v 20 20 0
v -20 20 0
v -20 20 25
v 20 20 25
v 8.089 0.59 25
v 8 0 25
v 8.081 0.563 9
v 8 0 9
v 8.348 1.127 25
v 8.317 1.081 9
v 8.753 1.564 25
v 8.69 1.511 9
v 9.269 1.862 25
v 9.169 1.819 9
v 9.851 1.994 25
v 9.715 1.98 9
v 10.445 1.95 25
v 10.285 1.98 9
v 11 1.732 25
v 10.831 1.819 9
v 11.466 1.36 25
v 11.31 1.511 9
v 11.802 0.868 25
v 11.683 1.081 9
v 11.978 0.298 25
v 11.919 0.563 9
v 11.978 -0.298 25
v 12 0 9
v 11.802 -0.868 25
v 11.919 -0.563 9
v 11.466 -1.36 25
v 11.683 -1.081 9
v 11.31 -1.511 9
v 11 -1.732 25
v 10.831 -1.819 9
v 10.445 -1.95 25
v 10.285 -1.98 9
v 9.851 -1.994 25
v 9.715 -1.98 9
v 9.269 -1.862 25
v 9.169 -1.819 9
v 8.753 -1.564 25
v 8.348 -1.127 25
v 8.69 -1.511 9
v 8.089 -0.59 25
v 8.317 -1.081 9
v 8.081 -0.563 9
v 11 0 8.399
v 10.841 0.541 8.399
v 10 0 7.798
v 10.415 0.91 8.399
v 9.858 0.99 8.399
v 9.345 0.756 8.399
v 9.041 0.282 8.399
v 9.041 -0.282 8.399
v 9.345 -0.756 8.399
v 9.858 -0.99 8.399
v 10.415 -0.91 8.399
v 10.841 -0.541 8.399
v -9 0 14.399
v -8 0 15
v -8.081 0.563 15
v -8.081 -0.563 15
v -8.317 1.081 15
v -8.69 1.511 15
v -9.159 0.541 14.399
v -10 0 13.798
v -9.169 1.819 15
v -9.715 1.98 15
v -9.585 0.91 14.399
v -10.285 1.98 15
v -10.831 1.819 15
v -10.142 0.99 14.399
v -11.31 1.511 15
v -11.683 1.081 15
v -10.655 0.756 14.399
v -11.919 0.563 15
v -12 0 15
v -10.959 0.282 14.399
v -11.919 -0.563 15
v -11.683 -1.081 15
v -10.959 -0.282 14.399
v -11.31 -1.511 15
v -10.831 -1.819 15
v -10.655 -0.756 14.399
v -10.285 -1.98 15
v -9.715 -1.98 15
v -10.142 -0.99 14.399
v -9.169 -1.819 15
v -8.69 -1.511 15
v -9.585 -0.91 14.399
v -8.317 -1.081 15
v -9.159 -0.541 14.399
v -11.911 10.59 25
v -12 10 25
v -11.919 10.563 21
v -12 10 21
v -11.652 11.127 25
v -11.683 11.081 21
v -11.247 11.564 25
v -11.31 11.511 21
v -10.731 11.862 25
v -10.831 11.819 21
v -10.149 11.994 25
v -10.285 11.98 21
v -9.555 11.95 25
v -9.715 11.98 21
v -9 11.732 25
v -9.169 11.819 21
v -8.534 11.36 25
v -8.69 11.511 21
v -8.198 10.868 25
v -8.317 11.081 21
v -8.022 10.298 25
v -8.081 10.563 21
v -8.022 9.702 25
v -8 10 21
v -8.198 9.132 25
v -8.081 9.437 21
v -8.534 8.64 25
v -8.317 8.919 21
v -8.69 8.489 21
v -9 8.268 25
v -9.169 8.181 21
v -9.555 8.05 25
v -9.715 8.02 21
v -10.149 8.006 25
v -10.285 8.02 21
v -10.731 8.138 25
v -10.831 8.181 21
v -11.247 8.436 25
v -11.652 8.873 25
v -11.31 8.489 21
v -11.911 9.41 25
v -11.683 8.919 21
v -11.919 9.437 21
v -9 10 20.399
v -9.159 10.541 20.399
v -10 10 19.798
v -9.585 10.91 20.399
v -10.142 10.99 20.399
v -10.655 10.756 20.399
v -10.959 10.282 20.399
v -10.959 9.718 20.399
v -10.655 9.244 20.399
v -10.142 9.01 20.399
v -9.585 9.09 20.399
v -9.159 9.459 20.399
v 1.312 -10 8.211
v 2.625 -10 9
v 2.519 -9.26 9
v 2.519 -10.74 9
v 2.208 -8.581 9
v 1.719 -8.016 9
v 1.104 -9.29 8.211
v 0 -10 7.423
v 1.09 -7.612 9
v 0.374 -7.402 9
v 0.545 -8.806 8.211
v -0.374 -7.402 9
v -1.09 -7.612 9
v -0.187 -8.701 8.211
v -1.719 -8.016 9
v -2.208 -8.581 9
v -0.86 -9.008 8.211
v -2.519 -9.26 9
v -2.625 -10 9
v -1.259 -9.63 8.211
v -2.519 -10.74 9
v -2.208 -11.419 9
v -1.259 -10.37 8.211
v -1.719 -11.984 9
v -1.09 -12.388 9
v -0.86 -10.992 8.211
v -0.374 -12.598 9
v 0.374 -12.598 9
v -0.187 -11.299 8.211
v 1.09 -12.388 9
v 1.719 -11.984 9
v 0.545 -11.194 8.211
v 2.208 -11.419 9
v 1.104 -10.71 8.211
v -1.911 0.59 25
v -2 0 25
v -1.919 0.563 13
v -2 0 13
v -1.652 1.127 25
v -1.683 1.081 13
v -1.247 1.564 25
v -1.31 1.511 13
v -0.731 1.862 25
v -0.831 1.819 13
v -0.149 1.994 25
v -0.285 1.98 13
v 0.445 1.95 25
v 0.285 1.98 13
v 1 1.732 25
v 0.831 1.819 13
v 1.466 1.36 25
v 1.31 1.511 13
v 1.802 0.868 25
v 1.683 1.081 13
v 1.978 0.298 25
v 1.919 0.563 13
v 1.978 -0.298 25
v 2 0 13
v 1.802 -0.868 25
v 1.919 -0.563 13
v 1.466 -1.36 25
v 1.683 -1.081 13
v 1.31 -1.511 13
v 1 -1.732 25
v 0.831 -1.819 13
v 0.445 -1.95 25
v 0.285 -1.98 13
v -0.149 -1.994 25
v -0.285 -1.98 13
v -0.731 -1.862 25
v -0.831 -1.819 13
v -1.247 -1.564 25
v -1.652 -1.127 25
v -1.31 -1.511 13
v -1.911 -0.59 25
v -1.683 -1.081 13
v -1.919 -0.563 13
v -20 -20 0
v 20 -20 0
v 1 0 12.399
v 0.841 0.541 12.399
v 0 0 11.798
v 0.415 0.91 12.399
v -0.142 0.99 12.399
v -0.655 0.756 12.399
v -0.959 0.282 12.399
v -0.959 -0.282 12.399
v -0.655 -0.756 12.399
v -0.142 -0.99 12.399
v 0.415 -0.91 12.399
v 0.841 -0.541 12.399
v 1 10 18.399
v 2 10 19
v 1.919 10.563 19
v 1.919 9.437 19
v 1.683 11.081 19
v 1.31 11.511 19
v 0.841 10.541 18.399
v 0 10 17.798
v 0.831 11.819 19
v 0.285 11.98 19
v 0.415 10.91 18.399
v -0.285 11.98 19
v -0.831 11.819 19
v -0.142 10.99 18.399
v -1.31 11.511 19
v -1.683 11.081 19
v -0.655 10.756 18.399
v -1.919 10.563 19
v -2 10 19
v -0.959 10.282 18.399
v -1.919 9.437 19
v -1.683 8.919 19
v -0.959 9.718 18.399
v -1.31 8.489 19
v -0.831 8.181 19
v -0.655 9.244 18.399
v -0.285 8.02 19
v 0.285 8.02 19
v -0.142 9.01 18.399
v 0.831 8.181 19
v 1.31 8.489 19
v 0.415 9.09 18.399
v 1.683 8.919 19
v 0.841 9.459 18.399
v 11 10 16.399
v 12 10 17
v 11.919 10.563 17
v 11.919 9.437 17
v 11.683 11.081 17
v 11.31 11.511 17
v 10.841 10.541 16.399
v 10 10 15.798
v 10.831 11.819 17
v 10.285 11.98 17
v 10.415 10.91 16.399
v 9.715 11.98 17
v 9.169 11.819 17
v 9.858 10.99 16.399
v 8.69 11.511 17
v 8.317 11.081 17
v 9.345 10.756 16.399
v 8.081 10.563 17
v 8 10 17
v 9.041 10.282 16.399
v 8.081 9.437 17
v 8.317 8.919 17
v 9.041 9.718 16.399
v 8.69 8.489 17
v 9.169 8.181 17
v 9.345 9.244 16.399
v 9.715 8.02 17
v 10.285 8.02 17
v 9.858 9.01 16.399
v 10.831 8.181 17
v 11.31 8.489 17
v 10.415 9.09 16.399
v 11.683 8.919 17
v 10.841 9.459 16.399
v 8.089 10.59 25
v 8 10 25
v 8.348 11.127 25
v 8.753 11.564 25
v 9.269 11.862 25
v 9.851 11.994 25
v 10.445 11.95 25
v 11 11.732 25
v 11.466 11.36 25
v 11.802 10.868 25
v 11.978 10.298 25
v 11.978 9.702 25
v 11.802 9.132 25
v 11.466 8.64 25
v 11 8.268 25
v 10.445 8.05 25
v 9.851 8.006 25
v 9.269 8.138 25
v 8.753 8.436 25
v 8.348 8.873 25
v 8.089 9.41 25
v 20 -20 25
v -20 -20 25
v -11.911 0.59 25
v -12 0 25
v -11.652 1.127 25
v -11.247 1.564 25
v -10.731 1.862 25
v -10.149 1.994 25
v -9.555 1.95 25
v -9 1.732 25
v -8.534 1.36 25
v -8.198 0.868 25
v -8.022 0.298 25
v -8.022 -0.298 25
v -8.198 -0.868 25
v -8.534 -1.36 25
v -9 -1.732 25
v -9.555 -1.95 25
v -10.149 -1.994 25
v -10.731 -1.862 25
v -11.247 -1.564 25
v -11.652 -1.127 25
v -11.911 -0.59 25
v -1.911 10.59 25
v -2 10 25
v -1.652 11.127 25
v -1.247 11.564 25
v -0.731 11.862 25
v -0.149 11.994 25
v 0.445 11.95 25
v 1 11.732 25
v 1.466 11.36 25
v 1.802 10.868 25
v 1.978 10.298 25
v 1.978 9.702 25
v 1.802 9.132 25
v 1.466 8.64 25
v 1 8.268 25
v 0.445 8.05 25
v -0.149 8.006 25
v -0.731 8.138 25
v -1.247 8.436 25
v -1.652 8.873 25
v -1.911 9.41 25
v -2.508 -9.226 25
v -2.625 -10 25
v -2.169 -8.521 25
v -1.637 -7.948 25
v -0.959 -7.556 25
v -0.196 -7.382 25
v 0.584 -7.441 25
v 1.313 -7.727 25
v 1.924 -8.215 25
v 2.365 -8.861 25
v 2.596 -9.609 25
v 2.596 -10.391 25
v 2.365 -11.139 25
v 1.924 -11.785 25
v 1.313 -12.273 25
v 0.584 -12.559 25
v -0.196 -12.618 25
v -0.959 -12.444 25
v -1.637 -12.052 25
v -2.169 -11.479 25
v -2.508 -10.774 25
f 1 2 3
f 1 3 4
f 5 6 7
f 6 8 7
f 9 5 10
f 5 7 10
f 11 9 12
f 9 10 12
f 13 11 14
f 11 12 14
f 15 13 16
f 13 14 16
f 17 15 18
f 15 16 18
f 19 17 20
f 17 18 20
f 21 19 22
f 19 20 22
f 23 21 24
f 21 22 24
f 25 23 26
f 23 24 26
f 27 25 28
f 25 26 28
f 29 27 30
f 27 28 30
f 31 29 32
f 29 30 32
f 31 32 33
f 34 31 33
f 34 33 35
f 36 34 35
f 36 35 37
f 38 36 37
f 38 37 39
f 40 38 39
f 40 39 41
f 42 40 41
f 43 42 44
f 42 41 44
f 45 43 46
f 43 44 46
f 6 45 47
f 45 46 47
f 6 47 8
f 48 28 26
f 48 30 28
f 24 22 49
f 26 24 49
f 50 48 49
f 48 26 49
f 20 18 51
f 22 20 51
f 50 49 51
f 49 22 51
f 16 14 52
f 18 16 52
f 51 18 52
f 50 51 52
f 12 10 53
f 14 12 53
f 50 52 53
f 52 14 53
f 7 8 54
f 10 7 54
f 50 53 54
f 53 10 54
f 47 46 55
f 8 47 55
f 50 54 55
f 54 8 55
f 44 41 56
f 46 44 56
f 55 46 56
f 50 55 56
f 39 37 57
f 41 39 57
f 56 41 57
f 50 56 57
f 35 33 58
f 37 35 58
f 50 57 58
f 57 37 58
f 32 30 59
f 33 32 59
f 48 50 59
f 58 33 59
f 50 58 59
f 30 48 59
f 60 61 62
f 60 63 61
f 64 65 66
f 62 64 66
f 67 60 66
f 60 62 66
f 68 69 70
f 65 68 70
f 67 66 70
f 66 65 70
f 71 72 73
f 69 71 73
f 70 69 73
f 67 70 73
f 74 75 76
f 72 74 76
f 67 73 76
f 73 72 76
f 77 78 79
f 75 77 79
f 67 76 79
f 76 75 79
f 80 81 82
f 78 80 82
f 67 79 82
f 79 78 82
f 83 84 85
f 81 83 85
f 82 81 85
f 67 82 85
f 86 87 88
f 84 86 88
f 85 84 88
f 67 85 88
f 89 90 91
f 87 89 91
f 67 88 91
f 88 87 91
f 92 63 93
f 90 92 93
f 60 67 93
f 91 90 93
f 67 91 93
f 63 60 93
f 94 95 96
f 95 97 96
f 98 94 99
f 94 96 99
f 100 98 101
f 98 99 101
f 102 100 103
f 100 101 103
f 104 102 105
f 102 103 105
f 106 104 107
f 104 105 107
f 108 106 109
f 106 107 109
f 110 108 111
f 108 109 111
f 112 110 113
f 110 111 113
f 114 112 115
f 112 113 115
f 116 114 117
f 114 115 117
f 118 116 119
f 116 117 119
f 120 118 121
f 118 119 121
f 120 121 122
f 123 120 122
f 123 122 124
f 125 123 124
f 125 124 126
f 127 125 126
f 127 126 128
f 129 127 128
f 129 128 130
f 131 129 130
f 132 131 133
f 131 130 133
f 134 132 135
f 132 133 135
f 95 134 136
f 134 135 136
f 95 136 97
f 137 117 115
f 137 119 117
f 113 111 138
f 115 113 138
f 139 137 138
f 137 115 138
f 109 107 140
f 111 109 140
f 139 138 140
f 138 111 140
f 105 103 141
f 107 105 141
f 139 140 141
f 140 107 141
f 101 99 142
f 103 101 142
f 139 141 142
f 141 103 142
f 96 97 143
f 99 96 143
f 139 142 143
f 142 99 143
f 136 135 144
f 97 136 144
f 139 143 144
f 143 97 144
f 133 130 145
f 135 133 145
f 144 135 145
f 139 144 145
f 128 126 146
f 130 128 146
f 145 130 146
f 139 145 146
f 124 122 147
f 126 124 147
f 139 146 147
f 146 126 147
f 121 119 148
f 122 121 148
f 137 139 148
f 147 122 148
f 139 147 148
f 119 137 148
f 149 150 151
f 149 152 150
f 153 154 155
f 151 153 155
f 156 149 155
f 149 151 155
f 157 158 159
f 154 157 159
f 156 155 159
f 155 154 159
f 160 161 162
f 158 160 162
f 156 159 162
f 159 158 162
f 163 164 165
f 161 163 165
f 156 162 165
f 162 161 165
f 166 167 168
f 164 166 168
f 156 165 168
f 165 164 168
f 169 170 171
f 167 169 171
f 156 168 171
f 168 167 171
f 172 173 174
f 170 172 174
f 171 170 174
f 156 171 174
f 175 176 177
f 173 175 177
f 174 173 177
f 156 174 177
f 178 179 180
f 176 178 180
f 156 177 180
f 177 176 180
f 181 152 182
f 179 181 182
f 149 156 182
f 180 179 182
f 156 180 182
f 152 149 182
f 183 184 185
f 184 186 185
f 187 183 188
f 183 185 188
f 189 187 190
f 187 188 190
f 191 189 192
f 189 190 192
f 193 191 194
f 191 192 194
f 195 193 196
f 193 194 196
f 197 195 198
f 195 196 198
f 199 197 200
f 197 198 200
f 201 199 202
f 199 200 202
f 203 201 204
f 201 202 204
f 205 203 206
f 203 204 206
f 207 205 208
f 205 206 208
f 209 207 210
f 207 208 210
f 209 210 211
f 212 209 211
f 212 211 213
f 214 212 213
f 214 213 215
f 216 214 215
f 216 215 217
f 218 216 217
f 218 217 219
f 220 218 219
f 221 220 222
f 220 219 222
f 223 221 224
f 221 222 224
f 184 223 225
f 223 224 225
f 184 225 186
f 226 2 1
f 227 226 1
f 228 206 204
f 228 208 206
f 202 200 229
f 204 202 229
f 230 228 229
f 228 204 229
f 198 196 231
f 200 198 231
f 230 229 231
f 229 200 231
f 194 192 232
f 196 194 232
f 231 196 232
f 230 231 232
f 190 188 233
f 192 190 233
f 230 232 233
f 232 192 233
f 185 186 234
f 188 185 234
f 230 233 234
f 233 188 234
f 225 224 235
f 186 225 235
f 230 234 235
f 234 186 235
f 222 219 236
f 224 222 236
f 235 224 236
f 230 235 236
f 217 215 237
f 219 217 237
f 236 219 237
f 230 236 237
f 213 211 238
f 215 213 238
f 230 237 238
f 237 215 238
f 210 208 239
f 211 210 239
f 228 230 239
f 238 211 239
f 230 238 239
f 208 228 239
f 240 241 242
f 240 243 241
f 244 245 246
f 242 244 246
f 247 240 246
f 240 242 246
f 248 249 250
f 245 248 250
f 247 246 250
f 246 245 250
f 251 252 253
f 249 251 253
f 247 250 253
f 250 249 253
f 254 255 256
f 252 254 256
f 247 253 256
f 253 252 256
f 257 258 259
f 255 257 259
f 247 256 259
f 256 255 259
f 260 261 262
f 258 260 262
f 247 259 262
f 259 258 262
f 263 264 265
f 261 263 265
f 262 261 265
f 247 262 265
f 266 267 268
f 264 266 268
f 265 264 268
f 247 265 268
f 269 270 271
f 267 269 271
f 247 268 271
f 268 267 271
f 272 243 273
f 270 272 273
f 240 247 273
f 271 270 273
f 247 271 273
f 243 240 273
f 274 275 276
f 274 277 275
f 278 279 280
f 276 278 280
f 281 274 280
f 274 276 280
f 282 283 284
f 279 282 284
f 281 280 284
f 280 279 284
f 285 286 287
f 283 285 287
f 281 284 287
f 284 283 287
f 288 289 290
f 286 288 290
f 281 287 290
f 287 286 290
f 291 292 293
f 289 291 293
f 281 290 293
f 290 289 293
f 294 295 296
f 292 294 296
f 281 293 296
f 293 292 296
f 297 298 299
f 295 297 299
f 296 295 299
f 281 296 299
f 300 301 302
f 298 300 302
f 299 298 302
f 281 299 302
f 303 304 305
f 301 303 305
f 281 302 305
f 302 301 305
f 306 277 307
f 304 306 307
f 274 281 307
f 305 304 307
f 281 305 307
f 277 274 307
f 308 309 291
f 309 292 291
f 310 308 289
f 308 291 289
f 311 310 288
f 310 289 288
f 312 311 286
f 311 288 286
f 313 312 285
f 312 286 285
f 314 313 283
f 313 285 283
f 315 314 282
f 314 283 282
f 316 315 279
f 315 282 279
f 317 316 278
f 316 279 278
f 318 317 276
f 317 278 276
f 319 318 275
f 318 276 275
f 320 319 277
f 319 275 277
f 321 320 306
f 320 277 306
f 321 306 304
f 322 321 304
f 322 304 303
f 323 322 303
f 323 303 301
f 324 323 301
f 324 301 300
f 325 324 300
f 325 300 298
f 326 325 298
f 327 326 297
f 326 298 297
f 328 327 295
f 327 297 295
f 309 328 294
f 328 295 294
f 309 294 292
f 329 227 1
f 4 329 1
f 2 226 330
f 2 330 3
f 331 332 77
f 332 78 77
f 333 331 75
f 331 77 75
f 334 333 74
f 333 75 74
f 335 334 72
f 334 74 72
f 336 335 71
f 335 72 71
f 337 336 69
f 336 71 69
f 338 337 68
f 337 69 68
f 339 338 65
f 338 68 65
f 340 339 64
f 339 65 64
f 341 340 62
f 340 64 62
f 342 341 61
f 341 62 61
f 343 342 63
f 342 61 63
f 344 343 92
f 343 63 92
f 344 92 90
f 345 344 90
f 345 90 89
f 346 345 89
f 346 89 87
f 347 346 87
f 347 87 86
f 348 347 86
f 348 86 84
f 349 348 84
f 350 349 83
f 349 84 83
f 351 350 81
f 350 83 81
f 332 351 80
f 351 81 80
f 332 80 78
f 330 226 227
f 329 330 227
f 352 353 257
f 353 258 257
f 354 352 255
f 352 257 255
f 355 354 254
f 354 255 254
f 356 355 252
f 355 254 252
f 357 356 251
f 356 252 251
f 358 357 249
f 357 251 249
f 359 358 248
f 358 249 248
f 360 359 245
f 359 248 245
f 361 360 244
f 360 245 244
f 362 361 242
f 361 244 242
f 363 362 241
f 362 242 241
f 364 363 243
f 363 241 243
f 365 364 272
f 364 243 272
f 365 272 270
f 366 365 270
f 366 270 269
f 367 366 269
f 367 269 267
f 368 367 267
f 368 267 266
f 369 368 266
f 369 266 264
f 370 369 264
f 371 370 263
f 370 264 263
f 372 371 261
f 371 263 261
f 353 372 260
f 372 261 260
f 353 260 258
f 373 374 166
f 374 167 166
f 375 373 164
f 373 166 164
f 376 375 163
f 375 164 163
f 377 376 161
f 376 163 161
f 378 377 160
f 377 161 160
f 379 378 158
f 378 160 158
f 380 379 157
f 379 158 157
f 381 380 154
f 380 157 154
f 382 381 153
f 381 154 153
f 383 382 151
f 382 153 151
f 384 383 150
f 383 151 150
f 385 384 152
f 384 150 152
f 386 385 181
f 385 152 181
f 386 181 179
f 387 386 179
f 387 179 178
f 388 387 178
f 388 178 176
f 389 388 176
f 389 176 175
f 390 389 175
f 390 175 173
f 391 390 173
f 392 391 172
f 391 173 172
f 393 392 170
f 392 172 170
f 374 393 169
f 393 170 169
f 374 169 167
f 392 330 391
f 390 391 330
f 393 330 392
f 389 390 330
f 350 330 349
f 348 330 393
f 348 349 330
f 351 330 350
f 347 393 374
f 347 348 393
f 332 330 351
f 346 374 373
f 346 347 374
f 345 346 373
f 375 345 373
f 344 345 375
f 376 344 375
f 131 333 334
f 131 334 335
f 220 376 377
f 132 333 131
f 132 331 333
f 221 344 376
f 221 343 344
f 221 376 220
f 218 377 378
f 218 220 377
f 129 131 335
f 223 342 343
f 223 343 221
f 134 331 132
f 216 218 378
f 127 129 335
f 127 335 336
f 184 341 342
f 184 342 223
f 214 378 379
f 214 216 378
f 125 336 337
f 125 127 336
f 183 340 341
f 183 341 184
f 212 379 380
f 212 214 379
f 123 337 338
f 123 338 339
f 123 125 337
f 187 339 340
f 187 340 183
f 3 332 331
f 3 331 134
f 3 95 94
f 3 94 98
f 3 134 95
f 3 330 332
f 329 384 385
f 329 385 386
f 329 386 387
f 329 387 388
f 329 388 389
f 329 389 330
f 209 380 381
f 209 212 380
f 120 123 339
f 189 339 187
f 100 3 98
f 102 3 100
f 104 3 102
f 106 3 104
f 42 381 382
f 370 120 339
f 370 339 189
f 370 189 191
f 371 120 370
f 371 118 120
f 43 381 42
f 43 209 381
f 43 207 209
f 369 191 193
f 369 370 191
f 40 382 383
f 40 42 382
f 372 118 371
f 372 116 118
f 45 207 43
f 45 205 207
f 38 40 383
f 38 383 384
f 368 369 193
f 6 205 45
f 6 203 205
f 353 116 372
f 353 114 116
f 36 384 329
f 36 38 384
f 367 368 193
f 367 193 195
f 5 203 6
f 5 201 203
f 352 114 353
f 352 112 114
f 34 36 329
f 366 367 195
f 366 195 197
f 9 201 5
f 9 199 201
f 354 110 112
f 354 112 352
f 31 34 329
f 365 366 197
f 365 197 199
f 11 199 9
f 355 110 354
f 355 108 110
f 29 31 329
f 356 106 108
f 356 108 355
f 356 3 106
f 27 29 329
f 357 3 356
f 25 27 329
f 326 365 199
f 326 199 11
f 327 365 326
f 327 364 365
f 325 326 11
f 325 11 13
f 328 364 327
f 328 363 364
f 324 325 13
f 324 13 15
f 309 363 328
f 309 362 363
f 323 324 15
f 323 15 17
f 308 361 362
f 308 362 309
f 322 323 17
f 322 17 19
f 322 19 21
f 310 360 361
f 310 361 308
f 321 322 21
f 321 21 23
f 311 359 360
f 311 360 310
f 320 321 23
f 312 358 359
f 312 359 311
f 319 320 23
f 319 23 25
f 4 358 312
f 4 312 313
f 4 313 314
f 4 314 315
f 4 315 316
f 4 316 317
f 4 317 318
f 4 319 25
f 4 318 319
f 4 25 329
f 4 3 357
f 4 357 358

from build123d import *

# Parameters (mm, degrees)
F0_W     = 40
F0_H     = 40
F1_DEPTH = 25
F3_D     = 4
F3_DEPTH = 4
F3_TIP   = 1.2017212381
F4_D     = 4
F4_DEPTH = 6
F4_TIP   = 1.2017212381
F5_D     = 4
F5_DEPTH = 8
F5_TIP   = 1.2017212381
F6_D     = 4
F6_DEPTH = 10
F6_TIP   = 1.2017212381
F7_D     = 4
F7_DEPTH = 12
F7_TIP   = 1.2017212381
F8_D     = 4
F8_DEPTH = 16
F8_TIP   = 1.2017212381
F9_D     = 5.25
F9_DEPTH = 16
F9_TIP   = 1.5772591249


with BuildPart() as f1:
    # F0 (on Top) → F1 (new body)
    with BuildSketch(Plane.XY):
        Rectangle(F0_W, F0_H)
    extrude(amount=F1_DEPTH)

    # F3
    with Locations(Plane.XY.offset(25)):
        with Locations((-10, 10)):
            Hole(F3_D / 2, depth=F3_DEPTH)
            with Locations((0, 0, -(F3_DEPTH + F3_TIP / 2))):  # 118° drill point
                Cone(0, F3_D / 2, F3_TIP, mode=Mode.SUBTRACT)

    # F4
    with Locations(Plane.XY.offset(25)):
        with Locations((0, 10)):
            Hole(F4_D / 2, depth=F4_DEPTH)
            with Locations((0, 0, -(F4_DEPTH + F4_TIP / 2))):  # 118° drill point
                Cone(0, F4_D / 2, F4_TIP, mode=Mode.SUBTRACT)

    # F5
    with Locations(Plane.XY.offset(25)):
        with Locations((10, 10)):
            Hole(F5_D / 2, depth=F5_DEPTH)
            with Locations((0, 0, -(F5_DEPTH + F5_TIP / 2))):  # 118° drill point
                Cone(0, F5_D / 2, F5_TIP, mode=Mode.SUBTRACT)

    # F6
    with Locations(Plane.XY.offset(25)):
        with Locations((-10, 0)):
            Hole(F6_D / 2, depth=F6_DEPTH)
            with Locations((0, 0, -(F6_DEPTH + F6_TIP / 2))):  # 118° drill point
                Cone(0, F6_D / 2, F6_TIP, mode=Mode.SUBTRACT)

    # F7
    with Locations(Plane.XY.offset(25)):
        with Locations((0, 0)):
            Hole(F7_D / 2, depth=F7_DEPTH)
            with Locations((0, 0, -(F7_DEPTH + F7_TIP / 2))):  # 118° drill point
                Cone(0, F7_D / 2, F7_TIP, mode=Mode.SUBTRACT)

    # F8
    with Locations(Plane.XY.offset(25)):
        with Locations((10, 0)):
            Hole(F8_D / 2, depth=F8_DEPTH)
            with Locations((0, 0, -(F8_DEPTH + F8_TIP / 2))):  # 118° drill point
                Cone(0, F8_D / 2, F8_TIP, mode=Mode.SUBTRACT)

    # F9
    with Locations(Plane.XY.offset(25)):
        with Locations((0, -10)):
            Hole(F9_D / 2, depth=F9_DEPTH)
            with Locations((0, 0, -(F9_DEPTH + F9_TIP / 2))):  # 118° drill point
                Cone(0, F9_D / 2, F9_TIP, mode=Mode.SUBTRACT)


solid = f1.part
